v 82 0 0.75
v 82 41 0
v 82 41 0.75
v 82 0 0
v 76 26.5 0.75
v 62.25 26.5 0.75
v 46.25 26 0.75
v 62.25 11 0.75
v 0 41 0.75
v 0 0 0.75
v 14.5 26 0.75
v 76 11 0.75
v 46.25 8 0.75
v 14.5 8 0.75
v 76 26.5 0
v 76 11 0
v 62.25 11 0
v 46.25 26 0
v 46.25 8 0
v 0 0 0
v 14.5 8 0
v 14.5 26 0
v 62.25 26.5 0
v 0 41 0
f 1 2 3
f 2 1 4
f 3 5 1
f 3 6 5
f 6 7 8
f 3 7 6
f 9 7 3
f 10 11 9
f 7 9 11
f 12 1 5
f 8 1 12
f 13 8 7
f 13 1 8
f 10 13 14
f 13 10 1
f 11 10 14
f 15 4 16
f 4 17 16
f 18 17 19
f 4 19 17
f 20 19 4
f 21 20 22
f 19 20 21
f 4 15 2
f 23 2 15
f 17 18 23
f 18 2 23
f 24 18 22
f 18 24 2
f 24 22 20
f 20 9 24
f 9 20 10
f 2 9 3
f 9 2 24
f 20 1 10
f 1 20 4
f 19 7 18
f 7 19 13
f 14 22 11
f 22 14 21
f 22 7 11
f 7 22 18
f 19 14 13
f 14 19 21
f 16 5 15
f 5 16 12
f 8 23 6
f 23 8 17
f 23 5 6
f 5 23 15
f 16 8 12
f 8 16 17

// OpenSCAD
/*
    Projekt Name: Trennwaende fuer das Modellhaus 3723
    Modul:  Wand Ostseite
    Projekt URL: https://github.com/Hardi-St/MobaLedLib_Docu/tree/master/3D_Daten_fuer_die_MobaLedLib/Trennwände%20für%20Häuser
    Version: 0.0.1
    Autor: Moba-Nick (mobanick@wp12085804.server-he.de)
    Lizenz: CC-BY-SA-4.0 (https://creativecommons.org/licenses/by-sa/4.0/legalcode.de)
*/
//  Alle Angaben sind immer in mm bei meinen Projekten.
//  Parameter fuer die Wand
x_all = 82;  //Breite der Wand = Breite der Grundplatte
z_all = 0.75; //Wandstaerke gibnt an, wie Dick die Wand ist. 0.75 ist dick genug um kein Licht durchzulassen, aber duenn genug um Material zu sparen.
y_erdgeschoss = 41;     //Hoehe Erdgeschoss 

difference(){
    HauptWand(2);
    Fenster(67.50,8,31.75,18);
    Fenster(19.75,11,13.75,15.5);
}



/* 
!!!!!!!!!!!!!!!!!!!!!!!!!!!!!!!!!!!!!!!!!!!!!!!!!!!!!!!!!!!!!!!!!!!    
!!!!    Ab hier kommen die Module. Bitte nur aendern wann man   !!!!
!!!!    weiss was man macht.                                    !!!!
!!!!!!!!!!!!!!!!!!!!!!!!!!!!!!!!!!!!!!!!!!!!!!!!!!!!!!!!!!!!!!!!!!!
/*  
    Das Module HauptWand erstellt die Wand des Hauses inkl. der Dachschraege aus einen Polyhydron. Dazu wurde im Bereich fuer die Parameter in den  Zeilen 10 - 14 die Werte fuer die Breite der Wand (x_all) sowie die Höhe des Erdgeschosses (y_erdgeschoss) und des oberen Stockwerks (y_dachschraege) angeben.
*/

module HauptWand(typ){
  if (typ == 1){    //mit Dachschräge
        //  PolyPunkte gibt an wo sicher welcher Punkt befindet. 
        //  Die Korrdinaten werden immer im Format [x,y,z] uebergeben.
        PolyPunkte = [
        [0,0,0],    // 0
        [0,y_erdgeschoss,0],    // 1
        [x_all/2,y_all,0],    // 2
        [x_all,y_erdgeschoss,0],    // 3
        [x_all,0,0],    // 4
        [0,0,z_all],    // 5
        [x_all,0,z_all],    // 6
        [x_all,y_erdgeschoss,z_all],    // 7
        [x_all/2,y_all,z_all],    // 8
        [0,y_erdgeschoss,z_all]];    // 9
        
        //  PolyFlaechen gibt an welche Punkte welche Flaechen beschreiben. 
        //  Die Korrdinaten werden immer im Format [x,y,z] uebergeben.
        PolyFlaechen =[
        [0,1,2,3,4],    // Unten (Boden)
        [5,0,4,6],      // Vorne (vordere Kante)
        [6,4,3,7],      // Rechts unten (Erdgeschoss)
        [7,3,2,8],      // Rechts oben  (Dachgeschoss/Dachschraege)
        [6,7,8,9,5],    // Oben (Deckel)
        [9,1,0,5],      // Links unten  (Erdgeschoss)
        [8,2,1,9]];     // Links oben   (Dachgeschoss/Dachschraege)
          
        polyhedron( PolyPunkte, PolyFlaechen );
    }else if (typ == 2){    //normale Wand ohne Dach
        cube([x_all,y_erdgeschoss,z_all],false);
    }else{
        
    }
}

/*  
    Das Module Fenster erstellt wie der Name schon sagt, die Ausschnitte fuer die Fenster.
    Dabei gibt es 4 Variablen die uebergeben werden.
    "pos_x" gibt die Startposition des linken unteren Ecke im Bezug zur Mittelachse des Hauses an.
    "pos_y" gibt die Startposition der inken untren Ecke im Bezug zur Grundplatte an.
    "size_x" gibt die Breite des Fensters an
    "size_y" gibt die Hoehe des Fensters an
    Beispiel: Der Befehl "Fenster(10,20,15,10);" erzeugt ein Fenster 10mm von der Mitte nach Rechts, auf der Hoehe von 20mm mit einer Breite von 15mm und einer Hoehe von 10mm;
*/
module Fenster(pos_x, pos_y, size_x, size_y){
    translate([x_all-pos_x, pos_y, 0]){
        cube([size_x,size_y,z_all*1.25],false);
    }
}

/*  
    Das Module Fenster_rund erstellt wie der Name schon sagt, die Ausschnitte fuer die Fenster mit rundem Ausschnitt.
    Dabei gibt es 3 Variablen die uebergeben werden.
    "pos_x" gibt die Startposition der linken unteren Ecke im Bezug zur Mittelachse des Hauses an.
    "pos_y" gibt die Startposition der inken unteren Ecke im Bezug zur Grundplatte an.
    "size_x" gibt die Breite des Fensters an
    Beispiel: Der Befehl "Fenster_rund(10,20,5);" erzeugt ein Fenster 10mm von der Mitte nach Rechts, auf der Hoehe von 20mm mit einem Durchmesser von 5mm;
*/
module Fenster_Rund(pos_x, pos_y, size_x){
    
    translate([x_all/2+pos_x+size_x/2, pos_y+size_x/2, 0]){
        cylinder(h=z_all*1.25,d=size_x,false);
    }
}
